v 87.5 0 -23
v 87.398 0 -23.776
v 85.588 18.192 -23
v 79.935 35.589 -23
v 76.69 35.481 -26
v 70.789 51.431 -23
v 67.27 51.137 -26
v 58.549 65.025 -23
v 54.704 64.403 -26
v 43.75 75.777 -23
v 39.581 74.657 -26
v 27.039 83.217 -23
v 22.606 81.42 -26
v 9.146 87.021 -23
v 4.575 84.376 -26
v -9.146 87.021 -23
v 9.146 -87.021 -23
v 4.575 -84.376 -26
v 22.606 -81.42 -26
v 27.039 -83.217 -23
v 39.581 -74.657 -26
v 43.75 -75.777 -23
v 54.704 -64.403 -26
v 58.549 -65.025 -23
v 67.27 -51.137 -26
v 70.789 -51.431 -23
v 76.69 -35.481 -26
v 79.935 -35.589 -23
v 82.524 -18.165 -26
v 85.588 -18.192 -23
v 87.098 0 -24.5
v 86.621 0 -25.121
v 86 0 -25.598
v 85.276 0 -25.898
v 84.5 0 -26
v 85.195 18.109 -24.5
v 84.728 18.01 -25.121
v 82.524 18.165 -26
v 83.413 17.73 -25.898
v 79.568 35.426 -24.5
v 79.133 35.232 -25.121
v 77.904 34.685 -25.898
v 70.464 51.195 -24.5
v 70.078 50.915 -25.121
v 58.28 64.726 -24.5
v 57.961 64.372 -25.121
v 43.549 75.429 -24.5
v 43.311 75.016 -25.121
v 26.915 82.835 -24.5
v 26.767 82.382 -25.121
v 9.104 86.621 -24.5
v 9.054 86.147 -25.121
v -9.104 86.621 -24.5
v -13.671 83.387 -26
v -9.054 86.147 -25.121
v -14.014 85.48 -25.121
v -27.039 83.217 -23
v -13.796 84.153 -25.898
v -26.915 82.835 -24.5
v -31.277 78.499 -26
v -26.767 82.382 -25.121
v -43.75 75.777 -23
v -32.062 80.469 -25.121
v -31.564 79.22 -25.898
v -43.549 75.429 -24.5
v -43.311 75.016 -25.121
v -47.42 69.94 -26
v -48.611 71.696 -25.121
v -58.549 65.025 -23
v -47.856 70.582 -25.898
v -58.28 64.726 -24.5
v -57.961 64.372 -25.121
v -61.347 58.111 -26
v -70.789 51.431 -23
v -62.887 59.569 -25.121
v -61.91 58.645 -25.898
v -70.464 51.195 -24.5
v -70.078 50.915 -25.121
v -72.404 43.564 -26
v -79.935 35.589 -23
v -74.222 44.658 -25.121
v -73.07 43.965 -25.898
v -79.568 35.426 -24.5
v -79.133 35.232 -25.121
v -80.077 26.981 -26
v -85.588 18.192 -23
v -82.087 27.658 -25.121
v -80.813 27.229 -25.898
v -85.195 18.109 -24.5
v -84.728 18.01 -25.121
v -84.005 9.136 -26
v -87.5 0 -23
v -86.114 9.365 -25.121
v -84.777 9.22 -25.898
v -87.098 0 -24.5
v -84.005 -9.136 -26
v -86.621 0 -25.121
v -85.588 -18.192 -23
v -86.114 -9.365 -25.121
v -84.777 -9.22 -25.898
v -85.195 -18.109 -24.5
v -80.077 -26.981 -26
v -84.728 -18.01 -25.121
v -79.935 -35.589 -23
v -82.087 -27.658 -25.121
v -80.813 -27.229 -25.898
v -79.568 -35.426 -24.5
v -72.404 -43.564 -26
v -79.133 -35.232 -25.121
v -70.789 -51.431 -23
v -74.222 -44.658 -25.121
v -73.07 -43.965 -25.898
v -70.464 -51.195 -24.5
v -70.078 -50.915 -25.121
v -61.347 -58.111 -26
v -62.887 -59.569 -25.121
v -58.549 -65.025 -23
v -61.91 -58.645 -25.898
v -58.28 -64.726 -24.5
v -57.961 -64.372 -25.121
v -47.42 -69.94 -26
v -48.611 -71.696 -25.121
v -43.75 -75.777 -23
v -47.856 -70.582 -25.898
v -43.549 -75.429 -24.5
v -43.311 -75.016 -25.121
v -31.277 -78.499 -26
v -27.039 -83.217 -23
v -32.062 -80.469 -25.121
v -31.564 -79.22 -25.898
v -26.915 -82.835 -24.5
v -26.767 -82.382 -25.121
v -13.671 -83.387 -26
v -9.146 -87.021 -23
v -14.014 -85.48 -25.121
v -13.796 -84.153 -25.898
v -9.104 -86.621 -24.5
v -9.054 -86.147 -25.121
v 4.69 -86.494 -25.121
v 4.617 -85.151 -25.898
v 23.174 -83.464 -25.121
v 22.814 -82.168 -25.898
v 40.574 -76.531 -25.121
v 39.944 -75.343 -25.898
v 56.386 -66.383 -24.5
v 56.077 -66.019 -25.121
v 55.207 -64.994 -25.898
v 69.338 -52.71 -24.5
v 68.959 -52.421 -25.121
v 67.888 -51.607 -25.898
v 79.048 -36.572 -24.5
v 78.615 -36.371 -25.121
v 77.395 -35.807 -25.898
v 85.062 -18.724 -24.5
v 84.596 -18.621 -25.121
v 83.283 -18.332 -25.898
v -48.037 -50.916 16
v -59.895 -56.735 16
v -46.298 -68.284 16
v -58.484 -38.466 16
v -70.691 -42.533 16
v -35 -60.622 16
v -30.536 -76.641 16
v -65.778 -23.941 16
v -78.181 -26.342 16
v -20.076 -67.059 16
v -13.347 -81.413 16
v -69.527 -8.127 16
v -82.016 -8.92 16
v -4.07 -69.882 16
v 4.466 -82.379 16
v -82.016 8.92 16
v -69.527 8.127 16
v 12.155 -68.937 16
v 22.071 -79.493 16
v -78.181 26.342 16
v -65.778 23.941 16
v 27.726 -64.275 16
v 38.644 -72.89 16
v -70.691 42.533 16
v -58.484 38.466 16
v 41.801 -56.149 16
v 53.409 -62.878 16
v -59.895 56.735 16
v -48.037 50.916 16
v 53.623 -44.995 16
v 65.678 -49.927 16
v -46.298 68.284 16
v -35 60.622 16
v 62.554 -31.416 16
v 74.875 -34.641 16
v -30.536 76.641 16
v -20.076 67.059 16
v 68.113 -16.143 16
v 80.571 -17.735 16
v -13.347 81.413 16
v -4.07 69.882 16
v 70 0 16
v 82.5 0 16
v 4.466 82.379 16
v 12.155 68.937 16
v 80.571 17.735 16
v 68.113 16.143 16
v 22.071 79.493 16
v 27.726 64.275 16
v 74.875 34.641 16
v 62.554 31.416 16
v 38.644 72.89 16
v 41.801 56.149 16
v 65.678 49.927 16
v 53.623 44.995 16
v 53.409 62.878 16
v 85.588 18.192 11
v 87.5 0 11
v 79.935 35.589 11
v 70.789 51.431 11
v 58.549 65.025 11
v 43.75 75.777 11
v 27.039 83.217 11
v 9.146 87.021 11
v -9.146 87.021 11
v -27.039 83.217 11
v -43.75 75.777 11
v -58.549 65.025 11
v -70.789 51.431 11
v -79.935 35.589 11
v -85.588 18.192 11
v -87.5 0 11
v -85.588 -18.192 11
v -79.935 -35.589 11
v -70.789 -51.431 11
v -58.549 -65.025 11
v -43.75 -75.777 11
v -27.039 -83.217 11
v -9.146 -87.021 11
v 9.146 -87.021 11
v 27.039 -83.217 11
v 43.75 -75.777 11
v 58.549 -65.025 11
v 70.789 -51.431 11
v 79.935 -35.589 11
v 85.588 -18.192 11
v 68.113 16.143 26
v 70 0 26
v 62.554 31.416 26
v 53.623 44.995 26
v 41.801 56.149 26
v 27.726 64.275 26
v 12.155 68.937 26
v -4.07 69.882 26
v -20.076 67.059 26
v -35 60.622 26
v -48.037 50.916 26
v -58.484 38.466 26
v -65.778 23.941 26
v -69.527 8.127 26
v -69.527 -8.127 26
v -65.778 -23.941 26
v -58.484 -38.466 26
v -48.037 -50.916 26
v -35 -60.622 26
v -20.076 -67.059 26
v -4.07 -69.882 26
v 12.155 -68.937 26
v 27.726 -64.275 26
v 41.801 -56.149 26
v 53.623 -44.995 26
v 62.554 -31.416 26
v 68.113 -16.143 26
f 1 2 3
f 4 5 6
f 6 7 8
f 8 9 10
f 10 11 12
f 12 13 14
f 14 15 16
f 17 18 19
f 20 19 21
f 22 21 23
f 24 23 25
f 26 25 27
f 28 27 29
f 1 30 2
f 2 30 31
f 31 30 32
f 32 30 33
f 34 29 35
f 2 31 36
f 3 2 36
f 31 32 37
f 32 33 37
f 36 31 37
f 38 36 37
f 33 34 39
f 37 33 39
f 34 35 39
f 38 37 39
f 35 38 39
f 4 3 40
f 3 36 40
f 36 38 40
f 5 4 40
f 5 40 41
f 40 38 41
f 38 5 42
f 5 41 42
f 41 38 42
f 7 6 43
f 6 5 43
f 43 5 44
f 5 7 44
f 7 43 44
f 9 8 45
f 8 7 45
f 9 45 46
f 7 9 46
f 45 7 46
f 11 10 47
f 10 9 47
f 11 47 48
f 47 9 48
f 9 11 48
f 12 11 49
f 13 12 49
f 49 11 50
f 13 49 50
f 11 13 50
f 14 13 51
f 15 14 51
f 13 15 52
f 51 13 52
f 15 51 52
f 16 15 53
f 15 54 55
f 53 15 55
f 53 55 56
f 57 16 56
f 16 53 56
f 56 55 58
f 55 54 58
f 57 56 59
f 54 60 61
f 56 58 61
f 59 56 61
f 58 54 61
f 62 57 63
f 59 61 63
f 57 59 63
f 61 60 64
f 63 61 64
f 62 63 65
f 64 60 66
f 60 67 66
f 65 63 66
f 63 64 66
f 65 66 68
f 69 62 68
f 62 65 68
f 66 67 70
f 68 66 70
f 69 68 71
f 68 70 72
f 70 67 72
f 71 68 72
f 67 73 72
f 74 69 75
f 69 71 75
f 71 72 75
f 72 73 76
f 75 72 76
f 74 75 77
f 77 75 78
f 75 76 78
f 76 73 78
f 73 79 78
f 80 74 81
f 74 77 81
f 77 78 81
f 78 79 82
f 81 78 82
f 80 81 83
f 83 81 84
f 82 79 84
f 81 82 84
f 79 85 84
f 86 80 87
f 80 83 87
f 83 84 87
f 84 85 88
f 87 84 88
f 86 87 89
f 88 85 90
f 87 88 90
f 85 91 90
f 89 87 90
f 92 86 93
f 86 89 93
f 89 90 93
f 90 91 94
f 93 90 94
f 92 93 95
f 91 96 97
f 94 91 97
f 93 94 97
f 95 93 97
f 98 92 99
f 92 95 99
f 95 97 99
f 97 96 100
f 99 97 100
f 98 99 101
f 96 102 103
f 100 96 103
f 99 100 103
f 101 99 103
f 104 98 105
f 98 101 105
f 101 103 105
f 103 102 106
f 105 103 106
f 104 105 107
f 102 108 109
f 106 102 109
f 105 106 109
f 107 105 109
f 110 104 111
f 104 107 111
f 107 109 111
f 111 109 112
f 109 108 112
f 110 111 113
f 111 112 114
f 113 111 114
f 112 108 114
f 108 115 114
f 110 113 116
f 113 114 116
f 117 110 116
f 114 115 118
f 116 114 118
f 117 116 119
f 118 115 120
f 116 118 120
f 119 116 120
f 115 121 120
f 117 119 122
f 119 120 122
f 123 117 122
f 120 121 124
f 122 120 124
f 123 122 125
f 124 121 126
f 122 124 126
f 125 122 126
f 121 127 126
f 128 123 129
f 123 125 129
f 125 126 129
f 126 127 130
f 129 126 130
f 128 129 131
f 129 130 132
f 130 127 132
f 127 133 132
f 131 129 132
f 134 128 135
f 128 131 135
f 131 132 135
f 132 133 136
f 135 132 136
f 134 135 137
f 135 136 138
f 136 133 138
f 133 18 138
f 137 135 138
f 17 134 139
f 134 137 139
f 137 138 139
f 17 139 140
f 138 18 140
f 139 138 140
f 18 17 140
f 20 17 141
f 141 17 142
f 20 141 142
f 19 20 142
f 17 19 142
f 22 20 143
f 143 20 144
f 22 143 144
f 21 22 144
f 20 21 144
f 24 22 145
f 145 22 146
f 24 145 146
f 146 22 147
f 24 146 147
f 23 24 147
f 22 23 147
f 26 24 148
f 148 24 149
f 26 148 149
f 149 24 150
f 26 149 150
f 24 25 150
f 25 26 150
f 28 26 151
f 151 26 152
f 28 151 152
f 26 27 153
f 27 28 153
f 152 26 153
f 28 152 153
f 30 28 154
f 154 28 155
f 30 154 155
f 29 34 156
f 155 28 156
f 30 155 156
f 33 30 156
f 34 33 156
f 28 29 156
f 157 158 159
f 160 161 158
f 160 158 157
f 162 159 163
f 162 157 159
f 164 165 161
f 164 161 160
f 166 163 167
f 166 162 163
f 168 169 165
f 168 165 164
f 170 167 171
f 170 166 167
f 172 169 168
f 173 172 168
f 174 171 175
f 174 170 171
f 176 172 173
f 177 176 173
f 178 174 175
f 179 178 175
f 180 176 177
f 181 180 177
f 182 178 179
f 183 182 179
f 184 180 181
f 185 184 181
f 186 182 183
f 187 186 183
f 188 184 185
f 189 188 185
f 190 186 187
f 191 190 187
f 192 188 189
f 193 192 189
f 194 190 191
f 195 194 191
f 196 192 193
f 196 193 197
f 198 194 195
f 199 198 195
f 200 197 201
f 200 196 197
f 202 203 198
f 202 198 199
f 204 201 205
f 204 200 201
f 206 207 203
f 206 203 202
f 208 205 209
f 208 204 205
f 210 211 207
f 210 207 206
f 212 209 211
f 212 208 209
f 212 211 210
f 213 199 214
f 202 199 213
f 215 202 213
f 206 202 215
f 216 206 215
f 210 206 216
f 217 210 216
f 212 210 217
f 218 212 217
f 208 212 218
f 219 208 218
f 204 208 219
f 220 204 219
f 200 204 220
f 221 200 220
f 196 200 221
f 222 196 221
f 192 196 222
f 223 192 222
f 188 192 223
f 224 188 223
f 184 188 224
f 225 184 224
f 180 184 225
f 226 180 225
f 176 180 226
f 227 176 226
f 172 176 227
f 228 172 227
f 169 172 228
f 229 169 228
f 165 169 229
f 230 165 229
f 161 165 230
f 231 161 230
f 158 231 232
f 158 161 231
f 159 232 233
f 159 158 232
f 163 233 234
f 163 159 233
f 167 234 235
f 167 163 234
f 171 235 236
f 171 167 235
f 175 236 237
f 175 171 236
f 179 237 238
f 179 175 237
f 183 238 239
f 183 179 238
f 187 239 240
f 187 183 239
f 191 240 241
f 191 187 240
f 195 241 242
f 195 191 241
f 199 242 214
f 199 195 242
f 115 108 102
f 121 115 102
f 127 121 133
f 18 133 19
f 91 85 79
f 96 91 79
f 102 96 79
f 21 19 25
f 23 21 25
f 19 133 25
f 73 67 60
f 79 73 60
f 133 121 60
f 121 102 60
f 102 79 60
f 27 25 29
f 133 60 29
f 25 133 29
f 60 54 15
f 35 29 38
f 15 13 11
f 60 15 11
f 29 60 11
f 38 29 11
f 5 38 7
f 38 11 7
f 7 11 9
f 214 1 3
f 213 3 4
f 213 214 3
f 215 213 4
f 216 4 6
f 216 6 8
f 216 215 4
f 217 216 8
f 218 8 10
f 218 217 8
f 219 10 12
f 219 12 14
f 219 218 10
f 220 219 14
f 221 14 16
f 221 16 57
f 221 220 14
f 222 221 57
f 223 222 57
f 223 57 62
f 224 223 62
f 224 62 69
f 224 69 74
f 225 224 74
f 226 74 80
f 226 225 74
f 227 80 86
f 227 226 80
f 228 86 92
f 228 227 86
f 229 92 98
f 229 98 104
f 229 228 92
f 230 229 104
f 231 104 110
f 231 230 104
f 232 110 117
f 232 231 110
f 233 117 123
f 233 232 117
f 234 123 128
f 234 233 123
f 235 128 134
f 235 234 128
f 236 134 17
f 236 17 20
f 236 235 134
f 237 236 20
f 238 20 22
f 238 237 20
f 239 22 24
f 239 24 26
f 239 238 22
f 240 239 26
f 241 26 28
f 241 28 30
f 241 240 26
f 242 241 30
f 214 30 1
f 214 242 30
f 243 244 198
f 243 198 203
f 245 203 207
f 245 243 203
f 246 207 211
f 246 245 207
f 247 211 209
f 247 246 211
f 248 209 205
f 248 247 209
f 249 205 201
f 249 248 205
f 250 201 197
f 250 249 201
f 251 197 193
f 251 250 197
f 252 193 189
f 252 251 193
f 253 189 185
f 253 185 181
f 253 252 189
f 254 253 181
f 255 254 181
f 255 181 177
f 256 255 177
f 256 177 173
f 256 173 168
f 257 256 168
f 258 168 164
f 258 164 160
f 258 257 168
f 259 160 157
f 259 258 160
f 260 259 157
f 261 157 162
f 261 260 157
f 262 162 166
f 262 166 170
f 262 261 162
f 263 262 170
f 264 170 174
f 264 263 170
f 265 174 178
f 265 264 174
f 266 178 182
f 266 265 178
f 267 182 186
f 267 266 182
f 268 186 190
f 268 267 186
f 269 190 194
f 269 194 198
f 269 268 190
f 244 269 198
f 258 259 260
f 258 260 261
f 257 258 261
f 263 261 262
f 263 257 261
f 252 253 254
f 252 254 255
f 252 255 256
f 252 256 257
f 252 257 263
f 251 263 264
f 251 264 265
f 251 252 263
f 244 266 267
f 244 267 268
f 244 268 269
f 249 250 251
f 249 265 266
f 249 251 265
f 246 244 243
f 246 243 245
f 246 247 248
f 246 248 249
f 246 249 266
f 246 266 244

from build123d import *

# Parameters (mm, degrees)
SKETCH1_R           = 87.5
BOSS_EXTRUDE1_DEPTH = 26
SKETCH2_R           = 107.528589123
SKETCH2_R_2         = 70
CUT_EXTRUDE1_DEPTH  = 10
CHAMFER1_SIZE       = 5
FILLET1_R           = 3


with BuildPart() as part:
    # Sketch1 → Boss-Extrude1 (new body, symmetric)
    with BuildSketch(Plane.XY):
        Circle(SKETCH1_R)
    extrude(amount=BOSS_EXTRUDE1_DEPTH, both=True)

    # Sketch2 → Cut-Extrude1 (cut)
    with BuildSketch(Plane.XY.offset(26)):
        Circle(SKETCH2_R)
        Circle(SKETCH2_R_2, mode=Mode.SUBTRACT)
    extrude(amount=-CUT_EXTRUDE1_DEPTH, mode=Mode.SUBTRACT)

    # Chamfer1
    chamfer1_edges = [part.edges().sort_by_distance(p)[0] for p in [
        (-87.5, 0, 16),
    ]]
    chamfer(chamfer1_edges, length=CHAMFER1_SIZE)

    # Fillet1
    fillet1_edges = [part.edges().sort_by_distance(p)[0] for p in [
        (-87.5, 0, -26),
    ]]
    fillet(fillet1_edges, radius=FILLET1_R)


solid = part.part
